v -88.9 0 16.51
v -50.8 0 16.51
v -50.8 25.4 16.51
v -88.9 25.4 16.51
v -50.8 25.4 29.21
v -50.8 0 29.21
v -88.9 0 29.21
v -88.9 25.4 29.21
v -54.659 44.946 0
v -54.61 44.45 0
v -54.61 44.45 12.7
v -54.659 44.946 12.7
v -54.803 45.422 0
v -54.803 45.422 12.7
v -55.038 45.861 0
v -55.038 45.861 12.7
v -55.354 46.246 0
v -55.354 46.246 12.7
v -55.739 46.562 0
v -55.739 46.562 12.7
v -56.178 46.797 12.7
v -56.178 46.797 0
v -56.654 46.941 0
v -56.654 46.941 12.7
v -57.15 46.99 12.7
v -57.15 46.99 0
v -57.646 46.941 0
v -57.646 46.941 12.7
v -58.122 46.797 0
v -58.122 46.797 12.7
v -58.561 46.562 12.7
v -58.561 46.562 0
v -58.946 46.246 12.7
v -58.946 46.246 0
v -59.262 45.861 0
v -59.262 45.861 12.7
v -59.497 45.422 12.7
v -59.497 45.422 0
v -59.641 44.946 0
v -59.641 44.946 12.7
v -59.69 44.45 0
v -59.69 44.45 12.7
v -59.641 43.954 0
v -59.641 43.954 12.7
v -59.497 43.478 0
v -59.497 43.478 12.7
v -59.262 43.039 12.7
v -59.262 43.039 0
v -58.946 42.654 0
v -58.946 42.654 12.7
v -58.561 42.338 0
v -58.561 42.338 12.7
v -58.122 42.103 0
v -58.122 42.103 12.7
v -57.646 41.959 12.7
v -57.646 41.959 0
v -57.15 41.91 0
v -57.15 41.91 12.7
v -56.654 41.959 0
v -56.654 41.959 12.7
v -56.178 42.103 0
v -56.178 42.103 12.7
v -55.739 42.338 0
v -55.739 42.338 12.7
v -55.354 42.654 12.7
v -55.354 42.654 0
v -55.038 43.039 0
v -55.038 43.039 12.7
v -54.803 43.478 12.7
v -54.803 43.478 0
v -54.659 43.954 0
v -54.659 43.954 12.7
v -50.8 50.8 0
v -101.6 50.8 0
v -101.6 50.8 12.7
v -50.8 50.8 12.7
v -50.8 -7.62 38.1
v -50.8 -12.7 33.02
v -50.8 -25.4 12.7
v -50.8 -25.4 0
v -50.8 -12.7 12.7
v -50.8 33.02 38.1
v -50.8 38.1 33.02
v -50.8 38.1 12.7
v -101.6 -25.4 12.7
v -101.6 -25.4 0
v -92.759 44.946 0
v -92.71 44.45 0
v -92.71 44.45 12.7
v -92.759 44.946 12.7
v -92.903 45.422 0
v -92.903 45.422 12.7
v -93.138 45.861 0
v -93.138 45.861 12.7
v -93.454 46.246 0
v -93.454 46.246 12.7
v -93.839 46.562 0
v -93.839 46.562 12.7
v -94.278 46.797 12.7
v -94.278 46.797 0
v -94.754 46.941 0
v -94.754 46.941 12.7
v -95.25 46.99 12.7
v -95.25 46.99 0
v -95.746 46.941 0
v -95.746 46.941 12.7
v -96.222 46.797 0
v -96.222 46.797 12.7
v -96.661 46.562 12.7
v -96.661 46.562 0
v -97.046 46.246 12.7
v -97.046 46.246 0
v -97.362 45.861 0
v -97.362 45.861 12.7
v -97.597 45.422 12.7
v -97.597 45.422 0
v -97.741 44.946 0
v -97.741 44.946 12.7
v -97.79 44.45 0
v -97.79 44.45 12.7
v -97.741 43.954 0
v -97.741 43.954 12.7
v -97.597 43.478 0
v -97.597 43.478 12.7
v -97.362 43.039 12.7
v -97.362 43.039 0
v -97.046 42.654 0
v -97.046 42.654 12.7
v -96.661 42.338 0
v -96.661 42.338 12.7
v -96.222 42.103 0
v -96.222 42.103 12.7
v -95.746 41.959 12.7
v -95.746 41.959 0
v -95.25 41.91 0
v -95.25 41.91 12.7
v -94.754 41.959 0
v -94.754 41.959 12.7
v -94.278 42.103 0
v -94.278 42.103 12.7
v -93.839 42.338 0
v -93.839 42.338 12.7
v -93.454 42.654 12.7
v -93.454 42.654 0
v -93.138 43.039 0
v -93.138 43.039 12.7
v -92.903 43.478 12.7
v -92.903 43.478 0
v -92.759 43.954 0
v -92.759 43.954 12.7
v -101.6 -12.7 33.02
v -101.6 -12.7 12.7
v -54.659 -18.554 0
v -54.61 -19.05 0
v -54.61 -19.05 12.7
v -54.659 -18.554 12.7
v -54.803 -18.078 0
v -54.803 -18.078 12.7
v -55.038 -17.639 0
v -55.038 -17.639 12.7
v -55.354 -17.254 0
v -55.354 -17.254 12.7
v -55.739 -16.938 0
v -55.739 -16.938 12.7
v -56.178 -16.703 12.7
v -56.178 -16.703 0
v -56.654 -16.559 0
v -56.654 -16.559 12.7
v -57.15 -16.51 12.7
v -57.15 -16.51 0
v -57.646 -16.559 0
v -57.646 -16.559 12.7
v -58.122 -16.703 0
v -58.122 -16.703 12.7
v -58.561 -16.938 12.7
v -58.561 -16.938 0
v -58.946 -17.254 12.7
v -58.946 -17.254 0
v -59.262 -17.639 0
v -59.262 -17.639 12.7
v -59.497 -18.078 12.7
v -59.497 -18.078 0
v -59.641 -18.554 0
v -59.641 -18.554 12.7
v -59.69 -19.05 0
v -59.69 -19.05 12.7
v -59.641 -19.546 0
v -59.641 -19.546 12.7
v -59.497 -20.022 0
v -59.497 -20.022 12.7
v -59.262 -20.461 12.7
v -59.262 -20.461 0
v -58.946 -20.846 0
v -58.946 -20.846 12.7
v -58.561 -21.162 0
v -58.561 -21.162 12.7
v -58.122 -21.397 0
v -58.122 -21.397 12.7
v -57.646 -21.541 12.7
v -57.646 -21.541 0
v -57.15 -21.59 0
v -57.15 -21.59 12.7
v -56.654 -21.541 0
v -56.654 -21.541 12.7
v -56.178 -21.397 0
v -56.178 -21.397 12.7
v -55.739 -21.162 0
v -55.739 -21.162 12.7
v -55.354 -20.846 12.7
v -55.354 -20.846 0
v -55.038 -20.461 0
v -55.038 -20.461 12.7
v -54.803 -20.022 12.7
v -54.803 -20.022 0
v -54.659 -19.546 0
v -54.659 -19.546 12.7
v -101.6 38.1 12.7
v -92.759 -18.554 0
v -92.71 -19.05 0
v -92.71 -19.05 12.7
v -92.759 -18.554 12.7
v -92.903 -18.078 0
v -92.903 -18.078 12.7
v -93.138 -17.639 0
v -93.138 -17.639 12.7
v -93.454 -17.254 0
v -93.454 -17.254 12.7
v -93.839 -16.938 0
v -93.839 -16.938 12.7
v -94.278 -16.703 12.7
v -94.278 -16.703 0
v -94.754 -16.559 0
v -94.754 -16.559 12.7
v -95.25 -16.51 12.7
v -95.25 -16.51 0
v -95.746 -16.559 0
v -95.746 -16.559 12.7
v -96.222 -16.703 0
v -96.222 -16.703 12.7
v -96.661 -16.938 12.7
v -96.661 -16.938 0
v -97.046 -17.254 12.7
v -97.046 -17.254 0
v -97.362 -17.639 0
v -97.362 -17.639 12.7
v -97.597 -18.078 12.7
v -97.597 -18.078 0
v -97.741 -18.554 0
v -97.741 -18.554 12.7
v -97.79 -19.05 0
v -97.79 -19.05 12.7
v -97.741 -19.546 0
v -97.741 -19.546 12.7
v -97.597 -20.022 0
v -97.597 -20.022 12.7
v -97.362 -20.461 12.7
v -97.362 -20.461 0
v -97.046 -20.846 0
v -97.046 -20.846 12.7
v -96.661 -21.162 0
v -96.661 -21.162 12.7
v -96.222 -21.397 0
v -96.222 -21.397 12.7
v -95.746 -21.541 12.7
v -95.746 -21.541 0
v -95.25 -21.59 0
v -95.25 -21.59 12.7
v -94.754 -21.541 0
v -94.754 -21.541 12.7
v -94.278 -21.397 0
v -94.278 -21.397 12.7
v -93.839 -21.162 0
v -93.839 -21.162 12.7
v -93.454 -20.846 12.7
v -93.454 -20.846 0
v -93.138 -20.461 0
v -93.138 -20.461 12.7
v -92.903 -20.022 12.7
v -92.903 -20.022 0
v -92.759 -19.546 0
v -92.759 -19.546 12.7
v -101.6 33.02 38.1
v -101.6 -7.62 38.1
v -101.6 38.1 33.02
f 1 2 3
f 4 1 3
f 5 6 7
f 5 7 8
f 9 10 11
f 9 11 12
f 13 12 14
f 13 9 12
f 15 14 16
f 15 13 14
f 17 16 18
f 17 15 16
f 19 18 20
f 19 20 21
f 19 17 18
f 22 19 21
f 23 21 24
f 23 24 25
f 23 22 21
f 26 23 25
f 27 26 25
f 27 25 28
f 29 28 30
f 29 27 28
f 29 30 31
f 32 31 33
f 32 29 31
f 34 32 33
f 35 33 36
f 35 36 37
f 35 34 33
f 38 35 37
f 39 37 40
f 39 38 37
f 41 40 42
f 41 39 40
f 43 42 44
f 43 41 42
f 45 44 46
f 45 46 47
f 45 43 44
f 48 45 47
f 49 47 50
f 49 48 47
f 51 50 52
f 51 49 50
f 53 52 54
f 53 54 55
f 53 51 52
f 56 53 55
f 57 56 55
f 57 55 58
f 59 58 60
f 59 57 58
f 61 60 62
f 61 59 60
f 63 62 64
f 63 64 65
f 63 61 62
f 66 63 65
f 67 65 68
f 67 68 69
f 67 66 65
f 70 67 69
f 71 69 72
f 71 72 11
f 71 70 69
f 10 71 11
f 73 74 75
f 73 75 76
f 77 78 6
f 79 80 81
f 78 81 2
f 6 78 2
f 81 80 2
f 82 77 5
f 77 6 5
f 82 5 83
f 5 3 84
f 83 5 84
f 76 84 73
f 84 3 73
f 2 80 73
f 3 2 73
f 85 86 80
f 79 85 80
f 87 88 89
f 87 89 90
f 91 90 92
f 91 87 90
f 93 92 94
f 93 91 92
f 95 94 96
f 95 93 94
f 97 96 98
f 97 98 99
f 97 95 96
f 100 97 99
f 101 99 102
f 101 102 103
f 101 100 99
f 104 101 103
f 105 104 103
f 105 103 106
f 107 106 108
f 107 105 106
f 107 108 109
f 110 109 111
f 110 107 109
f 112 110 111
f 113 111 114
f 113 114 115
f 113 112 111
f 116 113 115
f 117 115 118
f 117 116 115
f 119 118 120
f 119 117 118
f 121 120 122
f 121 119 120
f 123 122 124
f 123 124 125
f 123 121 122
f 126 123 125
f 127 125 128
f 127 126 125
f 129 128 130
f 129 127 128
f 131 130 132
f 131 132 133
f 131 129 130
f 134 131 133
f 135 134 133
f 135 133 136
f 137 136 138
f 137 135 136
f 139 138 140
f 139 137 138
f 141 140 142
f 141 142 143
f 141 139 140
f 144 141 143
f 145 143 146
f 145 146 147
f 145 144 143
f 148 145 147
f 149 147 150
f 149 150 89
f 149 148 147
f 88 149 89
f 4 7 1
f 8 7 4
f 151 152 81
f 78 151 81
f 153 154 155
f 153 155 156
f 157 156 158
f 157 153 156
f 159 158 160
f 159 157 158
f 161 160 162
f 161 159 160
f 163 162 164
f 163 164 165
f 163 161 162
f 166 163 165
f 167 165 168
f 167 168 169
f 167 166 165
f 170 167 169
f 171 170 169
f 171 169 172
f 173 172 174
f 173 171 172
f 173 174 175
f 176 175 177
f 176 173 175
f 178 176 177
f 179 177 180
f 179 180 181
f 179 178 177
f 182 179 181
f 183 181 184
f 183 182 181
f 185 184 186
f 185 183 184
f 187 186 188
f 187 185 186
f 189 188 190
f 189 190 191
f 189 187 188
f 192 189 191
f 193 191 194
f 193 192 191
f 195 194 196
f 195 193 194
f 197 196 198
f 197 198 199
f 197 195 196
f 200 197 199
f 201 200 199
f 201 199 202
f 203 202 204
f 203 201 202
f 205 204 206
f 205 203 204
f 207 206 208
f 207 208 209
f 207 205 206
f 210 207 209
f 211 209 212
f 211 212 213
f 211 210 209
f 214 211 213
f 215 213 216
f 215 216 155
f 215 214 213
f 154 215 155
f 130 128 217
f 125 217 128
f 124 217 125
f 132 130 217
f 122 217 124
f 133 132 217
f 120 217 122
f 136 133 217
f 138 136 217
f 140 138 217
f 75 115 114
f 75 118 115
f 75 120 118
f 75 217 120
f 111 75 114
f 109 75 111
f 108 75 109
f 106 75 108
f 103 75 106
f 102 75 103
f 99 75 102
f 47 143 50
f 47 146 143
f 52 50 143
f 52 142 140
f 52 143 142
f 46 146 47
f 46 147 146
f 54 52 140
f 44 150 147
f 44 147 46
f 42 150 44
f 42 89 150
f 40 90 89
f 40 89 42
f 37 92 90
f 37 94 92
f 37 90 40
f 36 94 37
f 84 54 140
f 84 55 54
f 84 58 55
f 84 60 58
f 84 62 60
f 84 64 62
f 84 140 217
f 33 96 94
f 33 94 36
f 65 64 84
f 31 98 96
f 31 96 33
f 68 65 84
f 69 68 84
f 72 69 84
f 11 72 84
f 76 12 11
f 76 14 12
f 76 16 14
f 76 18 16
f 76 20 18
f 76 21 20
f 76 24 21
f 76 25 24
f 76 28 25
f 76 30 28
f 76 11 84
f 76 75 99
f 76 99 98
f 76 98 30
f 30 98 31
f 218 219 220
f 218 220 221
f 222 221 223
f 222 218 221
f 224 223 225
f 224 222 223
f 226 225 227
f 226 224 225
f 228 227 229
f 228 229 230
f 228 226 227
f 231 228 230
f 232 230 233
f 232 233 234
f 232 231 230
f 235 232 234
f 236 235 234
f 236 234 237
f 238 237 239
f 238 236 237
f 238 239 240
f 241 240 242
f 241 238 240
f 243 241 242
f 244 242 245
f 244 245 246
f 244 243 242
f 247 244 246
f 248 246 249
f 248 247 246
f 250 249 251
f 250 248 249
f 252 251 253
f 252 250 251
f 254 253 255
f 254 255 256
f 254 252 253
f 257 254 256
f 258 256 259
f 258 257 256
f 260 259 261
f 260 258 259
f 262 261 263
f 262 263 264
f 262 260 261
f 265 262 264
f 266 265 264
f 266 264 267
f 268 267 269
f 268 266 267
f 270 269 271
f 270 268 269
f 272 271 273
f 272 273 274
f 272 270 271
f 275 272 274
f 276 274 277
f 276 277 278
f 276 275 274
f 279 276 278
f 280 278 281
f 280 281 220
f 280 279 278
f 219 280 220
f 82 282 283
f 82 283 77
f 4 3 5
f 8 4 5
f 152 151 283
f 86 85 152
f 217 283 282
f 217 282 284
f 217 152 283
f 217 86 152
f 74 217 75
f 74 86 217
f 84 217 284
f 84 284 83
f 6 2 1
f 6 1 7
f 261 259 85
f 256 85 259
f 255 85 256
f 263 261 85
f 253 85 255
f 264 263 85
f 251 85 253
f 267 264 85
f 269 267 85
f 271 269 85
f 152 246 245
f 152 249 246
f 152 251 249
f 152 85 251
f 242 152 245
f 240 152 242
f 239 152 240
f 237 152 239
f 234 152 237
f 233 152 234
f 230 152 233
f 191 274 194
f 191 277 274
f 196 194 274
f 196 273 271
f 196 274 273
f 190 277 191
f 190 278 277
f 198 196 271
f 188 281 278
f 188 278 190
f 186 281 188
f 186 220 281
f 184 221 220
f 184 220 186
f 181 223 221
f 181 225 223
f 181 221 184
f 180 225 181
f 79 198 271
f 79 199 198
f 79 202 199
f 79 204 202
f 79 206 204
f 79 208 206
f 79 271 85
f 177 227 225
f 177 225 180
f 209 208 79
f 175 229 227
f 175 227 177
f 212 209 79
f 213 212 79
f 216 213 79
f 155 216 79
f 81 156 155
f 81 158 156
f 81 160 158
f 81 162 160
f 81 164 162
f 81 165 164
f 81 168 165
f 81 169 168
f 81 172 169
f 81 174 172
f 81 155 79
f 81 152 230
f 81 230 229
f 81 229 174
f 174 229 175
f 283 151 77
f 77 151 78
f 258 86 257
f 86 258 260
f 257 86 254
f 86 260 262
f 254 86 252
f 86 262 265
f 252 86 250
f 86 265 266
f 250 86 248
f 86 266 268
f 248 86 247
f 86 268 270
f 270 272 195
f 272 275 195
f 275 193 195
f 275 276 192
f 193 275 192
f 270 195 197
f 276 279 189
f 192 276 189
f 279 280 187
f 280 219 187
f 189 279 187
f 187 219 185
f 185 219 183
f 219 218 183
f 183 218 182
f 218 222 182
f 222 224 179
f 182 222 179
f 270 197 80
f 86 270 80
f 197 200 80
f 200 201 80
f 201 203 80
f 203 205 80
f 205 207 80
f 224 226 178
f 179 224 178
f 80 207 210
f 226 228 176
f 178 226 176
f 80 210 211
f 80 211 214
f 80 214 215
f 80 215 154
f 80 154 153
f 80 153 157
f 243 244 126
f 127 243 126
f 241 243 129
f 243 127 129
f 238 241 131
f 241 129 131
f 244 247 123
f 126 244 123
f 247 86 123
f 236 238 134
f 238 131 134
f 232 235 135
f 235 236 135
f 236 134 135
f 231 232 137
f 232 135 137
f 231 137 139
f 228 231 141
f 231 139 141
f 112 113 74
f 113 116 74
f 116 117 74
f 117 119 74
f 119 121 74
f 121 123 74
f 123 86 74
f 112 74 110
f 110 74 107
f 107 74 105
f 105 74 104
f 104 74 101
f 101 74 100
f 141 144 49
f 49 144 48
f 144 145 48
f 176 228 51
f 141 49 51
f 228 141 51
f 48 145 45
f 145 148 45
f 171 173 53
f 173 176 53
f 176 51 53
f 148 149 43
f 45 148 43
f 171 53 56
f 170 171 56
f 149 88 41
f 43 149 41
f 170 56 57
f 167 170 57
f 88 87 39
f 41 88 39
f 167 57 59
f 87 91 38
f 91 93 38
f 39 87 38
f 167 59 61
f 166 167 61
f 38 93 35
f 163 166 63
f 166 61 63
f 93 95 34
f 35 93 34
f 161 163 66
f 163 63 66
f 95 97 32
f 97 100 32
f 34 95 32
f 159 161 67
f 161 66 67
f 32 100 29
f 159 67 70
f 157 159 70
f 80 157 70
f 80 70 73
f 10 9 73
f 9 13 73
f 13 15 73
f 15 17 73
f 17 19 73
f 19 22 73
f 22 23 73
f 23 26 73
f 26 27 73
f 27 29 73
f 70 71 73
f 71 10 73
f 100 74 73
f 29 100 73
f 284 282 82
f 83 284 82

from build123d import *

# Parameters (mm, degrees)
F0_W     = 50.8
F0_H     = 50.8
F1_DEPTH = 38.1
F0_H_2   = 12.7
F0_R     = 2.54
F2_DEPTH = 12.7
F3_SIZE  = 5.08
F4_W     = 25.4
F4_H     = 12.7
F5_DEPTH = 38.1


with BuildPart() as f1:
    # F0 (on Top) → F1 (new body)
    with BuildSketch(Plane.XY):
        with Locations((-76.2, 12.7)):
            Rectangle(F0_W, F0_H)
    extrude(amount=F1_DEPTH)

    # F0 (on Top) → F2 (join)
    with BuildSketch(Plane.XY):
        with Locations((-76.2, -19.05)):
            Rectangle(F0_W, F0_H_2)
        with Locations((-95.25, -19.05)):
            Circle(F0_R, mode=Mode.SUBTRACT)
        with Locations((-57.15, -19.05)):
            Circle(F0_R, mode=Mode.SUBTRACT)
        with Locations((-76.2, 44.45)):
            Rectangle(F0_W, F0_H_2)
        with Locations((-95.25, 44.45)):
            Circle(F0_R, mode=Mode.SUBTRACT)
        with Locations((-57.15, 44.45)):
            Circle(F0_R, mode=Mode.SUBTRACT)
    extrude(amount=F2_DEPTH)

    # F3
    f3_edges = [f1.edges().sort_by_distance(p)[0] for p in [
        (-76.2, 38.1, 38.1),
        (-76.2, -12.7, 38.1),
    ]]
    chamfer(f3_edges, length=F3_SIZE)

    # F4 (on face) → F5 (cut)
    with BuildSketch(Plane.YZ.offset(-50.8)):
        with Locations((12.7, 22.86)):
            Rectangle(F4_W, F4_H)
    extrude(amount=-F5_DEPTH, mode=Mode.SUBTRACT)


solid = f1.part
